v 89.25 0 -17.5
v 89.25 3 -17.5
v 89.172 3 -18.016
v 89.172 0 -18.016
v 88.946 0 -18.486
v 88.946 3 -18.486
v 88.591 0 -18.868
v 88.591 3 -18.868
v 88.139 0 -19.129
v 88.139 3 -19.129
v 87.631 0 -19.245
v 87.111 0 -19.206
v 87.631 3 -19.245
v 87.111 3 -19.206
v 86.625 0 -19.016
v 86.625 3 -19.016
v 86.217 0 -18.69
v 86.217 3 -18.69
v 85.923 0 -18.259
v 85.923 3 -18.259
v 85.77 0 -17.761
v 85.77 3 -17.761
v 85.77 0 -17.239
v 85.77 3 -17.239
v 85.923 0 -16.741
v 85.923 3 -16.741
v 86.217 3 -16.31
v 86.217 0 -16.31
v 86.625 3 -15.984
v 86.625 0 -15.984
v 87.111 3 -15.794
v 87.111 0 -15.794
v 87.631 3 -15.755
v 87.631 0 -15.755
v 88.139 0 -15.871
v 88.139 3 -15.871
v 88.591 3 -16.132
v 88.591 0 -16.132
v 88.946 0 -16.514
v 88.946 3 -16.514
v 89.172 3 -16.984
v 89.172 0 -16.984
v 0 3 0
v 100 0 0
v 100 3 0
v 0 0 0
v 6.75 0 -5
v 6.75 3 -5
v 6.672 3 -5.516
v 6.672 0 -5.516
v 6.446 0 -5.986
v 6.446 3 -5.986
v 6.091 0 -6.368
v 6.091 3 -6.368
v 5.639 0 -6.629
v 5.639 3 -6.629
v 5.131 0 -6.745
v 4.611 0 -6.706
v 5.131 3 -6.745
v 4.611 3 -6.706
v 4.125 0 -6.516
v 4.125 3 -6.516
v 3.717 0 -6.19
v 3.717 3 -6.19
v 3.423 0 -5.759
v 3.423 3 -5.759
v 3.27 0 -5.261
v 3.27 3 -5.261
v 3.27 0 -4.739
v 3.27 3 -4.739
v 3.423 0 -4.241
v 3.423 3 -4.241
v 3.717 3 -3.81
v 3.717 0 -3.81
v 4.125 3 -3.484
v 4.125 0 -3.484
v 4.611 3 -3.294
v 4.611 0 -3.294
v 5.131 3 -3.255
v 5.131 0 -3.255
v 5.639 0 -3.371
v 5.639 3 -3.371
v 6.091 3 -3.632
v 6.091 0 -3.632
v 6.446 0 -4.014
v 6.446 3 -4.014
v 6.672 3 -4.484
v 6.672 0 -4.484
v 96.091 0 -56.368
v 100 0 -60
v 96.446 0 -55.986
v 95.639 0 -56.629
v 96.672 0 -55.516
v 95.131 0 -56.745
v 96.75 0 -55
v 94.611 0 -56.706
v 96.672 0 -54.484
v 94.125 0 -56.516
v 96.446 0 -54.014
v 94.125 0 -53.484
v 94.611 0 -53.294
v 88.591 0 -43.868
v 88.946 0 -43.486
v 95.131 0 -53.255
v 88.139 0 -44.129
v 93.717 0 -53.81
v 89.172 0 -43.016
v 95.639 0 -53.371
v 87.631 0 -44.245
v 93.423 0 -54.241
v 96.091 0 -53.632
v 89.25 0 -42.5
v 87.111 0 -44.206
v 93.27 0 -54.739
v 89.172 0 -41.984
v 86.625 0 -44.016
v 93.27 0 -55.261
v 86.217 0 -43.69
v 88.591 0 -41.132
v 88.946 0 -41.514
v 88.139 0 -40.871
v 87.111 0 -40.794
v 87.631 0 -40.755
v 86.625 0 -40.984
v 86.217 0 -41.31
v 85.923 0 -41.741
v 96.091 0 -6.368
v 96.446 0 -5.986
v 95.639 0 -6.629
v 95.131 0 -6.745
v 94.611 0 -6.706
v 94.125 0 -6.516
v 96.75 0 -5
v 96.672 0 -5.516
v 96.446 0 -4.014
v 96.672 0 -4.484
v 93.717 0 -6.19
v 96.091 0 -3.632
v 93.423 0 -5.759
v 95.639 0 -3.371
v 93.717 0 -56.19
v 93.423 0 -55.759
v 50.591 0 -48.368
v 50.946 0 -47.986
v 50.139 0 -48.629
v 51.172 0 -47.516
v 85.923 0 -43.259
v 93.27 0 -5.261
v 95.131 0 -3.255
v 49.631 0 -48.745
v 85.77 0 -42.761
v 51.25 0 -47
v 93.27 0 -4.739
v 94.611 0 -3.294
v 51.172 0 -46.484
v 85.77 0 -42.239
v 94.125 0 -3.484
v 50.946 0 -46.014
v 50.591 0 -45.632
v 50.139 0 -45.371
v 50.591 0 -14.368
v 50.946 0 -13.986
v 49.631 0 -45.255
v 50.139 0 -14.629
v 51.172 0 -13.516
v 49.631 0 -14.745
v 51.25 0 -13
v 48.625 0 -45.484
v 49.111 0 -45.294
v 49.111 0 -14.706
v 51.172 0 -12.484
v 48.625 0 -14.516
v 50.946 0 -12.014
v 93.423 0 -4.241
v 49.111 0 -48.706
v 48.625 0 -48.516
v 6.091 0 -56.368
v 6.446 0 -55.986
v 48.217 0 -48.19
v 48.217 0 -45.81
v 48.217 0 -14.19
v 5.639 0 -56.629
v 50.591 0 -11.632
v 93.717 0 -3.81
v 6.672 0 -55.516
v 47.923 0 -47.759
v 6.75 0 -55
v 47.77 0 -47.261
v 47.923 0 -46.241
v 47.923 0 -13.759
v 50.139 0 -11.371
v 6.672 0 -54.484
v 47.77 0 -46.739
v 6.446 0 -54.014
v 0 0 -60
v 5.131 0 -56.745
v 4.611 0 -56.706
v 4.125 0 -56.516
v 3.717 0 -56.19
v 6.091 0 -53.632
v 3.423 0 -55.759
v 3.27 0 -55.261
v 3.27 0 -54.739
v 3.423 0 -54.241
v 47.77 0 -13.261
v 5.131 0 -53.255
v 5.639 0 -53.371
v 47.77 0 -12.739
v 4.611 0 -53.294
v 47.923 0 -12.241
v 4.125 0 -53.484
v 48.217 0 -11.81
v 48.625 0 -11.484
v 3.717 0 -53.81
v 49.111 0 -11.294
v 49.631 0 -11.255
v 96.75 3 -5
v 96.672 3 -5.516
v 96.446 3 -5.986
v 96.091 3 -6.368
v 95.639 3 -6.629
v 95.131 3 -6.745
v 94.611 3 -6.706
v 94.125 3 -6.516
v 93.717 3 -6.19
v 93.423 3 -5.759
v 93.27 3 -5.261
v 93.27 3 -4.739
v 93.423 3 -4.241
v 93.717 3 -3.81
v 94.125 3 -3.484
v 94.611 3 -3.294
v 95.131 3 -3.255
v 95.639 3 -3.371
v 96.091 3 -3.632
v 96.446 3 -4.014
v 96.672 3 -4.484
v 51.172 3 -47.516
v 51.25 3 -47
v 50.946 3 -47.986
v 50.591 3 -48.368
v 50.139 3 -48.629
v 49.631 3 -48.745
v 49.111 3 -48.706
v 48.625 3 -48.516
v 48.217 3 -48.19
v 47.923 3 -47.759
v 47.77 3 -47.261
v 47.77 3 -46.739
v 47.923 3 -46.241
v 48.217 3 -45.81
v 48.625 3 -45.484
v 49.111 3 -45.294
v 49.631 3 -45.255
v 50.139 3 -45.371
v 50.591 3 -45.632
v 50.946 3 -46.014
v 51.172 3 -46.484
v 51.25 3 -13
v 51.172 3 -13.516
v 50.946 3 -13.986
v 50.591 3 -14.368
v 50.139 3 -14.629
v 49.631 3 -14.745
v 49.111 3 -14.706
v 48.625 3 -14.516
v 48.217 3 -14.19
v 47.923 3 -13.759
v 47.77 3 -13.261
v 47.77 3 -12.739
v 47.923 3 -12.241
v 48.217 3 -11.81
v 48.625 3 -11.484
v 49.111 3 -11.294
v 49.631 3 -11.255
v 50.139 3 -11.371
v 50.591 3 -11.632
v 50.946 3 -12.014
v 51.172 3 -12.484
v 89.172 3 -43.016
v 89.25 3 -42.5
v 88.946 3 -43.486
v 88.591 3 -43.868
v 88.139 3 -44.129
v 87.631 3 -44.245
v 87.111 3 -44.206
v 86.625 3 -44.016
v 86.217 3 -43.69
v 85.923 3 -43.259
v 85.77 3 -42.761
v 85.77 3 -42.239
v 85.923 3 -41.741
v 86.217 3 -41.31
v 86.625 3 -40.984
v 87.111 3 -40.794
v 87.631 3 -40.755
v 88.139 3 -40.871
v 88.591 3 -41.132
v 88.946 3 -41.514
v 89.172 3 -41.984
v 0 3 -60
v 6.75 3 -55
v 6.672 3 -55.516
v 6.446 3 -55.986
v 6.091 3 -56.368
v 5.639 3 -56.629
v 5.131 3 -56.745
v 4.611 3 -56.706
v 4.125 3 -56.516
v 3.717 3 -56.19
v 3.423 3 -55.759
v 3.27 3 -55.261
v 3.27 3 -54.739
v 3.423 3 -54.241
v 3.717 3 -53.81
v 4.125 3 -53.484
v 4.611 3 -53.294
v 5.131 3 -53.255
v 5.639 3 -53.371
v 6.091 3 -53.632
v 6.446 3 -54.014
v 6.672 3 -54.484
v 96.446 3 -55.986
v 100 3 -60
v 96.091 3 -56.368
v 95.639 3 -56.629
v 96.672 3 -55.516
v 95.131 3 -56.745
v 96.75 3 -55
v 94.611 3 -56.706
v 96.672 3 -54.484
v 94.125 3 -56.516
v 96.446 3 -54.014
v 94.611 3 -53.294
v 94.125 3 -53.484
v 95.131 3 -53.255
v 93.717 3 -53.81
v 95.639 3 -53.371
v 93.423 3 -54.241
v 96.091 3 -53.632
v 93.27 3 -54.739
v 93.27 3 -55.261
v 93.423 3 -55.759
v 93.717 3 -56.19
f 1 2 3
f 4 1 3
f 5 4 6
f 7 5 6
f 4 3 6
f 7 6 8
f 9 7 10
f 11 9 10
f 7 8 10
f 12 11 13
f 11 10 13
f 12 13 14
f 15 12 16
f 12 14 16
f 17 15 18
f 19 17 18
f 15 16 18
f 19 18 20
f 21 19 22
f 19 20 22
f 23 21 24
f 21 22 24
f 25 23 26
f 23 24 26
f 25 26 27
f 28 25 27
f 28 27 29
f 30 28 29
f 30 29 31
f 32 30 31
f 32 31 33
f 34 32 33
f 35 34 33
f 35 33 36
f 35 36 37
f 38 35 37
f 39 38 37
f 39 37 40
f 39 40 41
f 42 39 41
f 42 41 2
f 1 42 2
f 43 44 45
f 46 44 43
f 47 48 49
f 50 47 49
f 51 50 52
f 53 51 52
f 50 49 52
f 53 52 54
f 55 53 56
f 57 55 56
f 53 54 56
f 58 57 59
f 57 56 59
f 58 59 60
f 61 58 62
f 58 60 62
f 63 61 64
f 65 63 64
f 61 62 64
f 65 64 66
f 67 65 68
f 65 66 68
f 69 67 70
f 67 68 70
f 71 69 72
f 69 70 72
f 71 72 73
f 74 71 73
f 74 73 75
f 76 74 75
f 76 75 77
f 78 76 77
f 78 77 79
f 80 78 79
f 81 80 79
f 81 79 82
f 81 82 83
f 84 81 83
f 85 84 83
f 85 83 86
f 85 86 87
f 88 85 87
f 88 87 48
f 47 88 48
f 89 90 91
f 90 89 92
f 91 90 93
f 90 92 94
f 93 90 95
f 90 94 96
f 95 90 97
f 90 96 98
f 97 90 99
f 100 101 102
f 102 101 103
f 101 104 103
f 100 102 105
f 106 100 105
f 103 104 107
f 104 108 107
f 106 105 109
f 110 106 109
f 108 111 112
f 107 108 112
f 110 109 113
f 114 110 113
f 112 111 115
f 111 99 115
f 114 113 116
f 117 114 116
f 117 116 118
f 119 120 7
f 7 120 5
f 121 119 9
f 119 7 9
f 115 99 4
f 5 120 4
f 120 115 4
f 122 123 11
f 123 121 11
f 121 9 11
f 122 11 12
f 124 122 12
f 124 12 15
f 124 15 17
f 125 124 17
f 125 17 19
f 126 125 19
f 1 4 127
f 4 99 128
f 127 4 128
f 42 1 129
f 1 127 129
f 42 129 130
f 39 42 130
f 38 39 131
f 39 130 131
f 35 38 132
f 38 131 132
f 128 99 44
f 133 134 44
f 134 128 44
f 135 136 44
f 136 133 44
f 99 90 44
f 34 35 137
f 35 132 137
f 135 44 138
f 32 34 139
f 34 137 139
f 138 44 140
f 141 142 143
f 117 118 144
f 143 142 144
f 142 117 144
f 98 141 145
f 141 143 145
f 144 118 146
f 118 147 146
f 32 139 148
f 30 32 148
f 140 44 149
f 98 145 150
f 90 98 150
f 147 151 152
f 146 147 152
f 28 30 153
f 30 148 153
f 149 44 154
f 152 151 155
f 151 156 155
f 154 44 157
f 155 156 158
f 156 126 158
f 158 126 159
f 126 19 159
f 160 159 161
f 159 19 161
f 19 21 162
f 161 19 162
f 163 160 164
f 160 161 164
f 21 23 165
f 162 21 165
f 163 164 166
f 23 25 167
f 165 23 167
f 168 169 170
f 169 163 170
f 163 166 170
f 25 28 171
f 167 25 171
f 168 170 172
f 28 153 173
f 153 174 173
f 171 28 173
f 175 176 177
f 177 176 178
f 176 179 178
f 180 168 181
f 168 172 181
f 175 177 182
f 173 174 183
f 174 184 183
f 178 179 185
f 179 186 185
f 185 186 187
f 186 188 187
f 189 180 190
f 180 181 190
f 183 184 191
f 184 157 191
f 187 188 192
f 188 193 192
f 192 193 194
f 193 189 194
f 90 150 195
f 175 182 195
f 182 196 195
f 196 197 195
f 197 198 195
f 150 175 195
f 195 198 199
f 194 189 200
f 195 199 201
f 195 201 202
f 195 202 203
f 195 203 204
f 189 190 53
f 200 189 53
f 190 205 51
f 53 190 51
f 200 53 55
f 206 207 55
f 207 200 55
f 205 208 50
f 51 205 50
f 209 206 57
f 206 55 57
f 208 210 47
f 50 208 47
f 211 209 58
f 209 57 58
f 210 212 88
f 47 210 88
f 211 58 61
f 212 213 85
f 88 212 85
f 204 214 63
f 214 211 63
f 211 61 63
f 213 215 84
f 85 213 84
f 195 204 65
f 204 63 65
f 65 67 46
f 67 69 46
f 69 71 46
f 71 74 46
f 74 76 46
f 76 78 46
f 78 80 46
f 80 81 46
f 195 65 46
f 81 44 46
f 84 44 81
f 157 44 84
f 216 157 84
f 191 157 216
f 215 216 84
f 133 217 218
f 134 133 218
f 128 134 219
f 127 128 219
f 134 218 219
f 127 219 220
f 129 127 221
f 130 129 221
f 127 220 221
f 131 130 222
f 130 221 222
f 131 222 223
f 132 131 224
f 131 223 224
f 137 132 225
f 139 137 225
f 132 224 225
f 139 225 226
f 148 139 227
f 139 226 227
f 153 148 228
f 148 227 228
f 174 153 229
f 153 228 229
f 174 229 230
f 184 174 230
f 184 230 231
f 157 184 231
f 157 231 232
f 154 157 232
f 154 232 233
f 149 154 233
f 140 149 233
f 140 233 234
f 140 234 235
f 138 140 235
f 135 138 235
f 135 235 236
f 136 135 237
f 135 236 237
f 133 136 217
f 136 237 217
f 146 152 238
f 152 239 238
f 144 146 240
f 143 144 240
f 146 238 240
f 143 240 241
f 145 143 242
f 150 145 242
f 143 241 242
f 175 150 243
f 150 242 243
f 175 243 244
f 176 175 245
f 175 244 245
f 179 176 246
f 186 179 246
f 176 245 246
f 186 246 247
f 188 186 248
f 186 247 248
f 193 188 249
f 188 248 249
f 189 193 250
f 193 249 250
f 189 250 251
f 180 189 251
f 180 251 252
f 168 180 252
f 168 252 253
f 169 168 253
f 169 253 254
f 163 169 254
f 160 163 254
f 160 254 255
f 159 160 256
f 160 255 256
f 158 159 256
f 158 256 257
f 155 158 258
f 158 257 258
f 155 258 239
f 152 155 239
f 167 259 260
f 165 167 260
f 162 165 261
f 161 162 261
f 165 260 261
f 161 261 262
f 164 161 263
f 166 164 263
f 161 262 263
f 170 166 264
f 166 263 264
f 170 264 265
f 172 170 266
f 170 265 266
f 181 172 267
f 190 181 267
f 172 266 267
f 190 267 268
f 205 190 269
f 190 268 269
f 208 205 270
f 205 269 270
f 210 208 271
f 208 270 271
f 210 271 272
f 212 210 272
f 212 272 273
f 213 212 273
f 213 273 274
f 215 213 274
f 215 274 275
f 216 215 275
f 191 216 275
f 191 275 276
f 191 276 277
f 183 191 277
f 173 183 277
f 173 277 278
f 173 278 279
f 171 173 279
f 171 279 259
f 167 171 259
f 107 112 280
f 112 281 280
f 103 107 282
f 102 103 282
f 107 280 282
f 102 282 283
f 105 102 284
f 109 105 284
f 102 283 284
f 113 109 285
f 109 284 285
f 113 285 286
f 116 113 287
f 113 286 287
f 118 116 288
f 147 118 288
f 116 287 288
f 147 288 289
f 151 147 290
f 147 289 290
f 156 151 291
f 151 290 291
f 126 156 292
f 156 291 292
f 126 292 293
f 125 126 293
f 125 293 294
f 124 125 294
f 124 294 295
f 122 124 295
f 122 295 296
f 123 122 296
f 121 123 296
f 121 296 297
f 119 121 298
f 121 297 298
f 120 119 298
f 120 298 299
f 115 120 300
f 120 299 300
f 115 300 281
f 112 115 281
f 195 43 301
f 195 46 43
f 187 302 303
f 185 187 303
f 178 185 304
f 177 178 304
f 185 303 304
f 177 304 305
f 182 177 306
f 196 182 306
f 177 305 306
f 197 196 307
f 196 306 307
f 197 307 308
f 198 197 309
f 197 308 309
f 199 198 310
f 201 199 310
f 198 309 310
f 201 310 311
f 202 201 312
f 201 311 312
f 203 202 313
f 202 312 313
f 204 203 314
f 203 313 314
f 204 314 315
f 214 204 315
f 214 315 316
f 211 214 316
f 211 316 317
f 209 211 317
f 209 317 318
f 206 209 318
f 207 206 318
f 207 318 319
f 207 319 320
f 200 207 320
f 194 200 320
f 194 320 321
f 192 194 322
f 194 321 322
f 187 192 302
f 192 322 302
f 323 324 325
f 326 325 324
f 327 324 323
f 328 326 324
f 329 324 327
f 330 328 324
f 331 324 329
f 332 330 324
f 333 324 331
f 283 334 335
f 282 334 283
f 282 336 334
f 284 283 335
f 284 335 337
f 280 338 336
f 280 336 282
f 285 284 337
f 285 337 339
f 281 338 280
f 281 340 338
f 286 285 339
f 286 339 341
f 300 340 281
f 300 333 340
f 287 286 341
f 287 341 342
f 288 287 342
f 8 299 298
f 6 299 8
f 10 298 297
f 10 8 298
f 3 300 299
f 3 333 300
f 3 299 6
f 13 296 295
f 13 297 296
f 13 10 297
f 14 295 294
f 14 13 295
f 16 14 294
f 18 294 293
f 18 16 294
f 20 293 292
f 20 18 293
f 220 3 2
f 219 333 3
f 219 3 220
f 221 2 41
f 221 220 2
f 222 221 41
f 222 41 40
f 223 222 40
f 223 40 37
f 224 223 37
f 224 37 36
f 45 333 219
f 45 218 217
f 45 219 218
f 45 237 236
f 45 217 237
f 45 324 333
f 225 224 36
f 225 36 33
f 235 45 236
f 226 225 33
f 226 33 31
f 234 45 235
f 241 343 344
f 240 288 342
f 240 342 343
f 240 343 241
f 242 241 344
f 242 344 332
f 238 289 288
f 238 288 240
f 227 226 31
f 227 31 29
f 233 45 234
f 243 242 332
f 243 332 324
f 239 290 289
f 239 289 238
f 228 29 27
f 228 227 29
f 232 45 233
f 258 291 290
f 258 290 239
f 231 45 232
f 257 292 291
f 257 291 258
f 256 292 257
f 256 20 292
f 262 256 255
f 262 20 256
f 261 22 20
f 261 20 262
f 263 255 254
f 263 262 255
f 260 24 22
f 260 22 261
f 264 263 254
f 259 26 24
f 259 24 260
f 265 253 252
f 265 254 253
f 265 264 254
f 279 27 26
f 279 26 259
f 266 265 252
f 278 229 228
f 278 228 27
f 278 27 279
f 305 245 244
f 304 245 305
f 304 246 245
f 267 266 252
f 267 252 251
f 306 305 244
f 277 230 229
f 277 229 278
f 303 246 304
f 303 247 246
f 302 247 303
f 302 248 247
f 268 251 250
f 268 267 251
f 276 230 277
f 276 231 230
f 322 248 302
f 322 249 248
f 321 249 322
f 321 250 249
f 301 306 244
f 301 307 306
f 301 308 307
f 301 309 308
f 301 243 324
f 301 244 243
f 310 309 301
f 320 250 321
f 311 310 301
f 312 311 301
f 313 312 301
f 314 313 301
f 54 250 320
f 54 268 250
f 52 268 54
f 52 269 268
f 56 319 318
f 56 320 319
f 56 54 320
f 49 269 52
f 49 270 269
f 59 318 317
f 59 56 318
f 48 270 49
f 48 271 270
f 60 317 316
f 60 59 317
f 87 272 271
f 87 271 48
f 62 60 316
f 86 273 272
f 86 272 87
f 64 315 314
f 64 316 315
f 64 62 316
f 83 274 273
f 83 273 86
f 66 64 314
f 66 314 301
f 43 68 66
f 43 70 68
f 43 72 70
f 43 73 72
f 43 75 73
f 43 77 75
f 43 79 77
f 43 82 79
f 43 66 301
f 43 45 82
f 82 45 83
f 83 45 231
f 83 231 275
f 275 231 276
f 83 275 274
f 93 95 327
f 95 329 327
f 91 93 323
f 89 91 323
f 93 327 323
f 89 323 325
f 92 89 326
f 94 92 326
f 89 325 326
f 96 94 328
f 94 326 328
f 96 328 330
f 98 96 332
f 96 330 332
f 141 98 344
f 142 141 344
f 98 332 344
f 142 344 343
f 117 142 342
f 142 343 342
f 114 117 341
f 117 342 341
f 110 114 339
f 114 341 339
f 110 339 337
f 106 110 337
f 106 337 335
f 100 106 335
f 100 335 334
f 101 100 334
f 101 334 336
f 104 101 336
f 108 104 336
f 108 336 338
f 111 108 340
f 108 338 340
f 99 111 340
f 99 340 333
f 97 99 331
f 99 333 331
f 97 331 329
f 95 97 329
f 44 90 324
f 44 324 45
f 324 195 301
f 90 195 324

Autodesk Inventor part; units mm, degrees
ref_plane "YZ Plane" through (0, 0, 0) normal (1, 0, 0) x (0, 1, 0)
ref_plane "XZ Plane" through (0, 0, 0) normal (0, 1, 0) x (-1, 0, 0)
ref_plane "XY Plane" through (0, 0, 0) normal (0, 0, 1) x (1, 0, 0)
sketch "Sketch1" plane through (0, 0, 0) normal (0, 1, 0) x (-1, 0, 0)
  line L0 (0, -60) -> (-100, -60)
  line L1 (-100, -60) -> (-100, 0)
  line L2 (-100, 0) -> (0, 0)
  line L3 (0, 0) -> (0, -60)
  dimension "d0" = 100
  dimension "d1" = 60
extrude "Extrusion1" add sketch "Sketch1" along normal blind 3
sketch "Sketch2" plane through (0, 3, 0) normal (0, 1, 0) x (1, 0, 0)
  circle A0 centre (5, 55) radius 1.75
  line L0 (100, 60) -> (0, 60) projected
  line L1 (0, 60) -> (0, 0) projected
  circle A1 centre (95, 55) radius 1.75
  circle A2 centre (5, 5) radius 1.75
  circle A3 centre (95, 5) radius 1.75
  circle A4 centre (87.5, 42.5) radius 1.75
  circle A5 centre (87.5, 17.5) radius 1.75
  line L2 (100, 0) -> (100, 60) projected
  circle A6 centre (49.5, 47) radius 1.75
  circle A7 centre (49.5, 13) radius 1.75
  dimension "d4" = 3.5
  dimension "d5" = 5
  dimension "d6" = 5
  dimension "d9" = 90
  dimension "d12" = 50
  dimension "d15" = 3.5
  dimension "d16" = 3.5
  dimension "d17" = 25
  dimension "d18" = 0
  dimension "d19" = 12.5
  dimension "d20" = 3.5
  dimension "d21" = 3.5
  dimension "d22" = 34
  dimension "d23" = 0
  dimension "d24" = 38
  dimension "d25" = 17.5
  dimension "d26" = 13
extrude "Extrusion2" cut sketch "Sketch2" against normal through all
properties part number "rfid_cover"
